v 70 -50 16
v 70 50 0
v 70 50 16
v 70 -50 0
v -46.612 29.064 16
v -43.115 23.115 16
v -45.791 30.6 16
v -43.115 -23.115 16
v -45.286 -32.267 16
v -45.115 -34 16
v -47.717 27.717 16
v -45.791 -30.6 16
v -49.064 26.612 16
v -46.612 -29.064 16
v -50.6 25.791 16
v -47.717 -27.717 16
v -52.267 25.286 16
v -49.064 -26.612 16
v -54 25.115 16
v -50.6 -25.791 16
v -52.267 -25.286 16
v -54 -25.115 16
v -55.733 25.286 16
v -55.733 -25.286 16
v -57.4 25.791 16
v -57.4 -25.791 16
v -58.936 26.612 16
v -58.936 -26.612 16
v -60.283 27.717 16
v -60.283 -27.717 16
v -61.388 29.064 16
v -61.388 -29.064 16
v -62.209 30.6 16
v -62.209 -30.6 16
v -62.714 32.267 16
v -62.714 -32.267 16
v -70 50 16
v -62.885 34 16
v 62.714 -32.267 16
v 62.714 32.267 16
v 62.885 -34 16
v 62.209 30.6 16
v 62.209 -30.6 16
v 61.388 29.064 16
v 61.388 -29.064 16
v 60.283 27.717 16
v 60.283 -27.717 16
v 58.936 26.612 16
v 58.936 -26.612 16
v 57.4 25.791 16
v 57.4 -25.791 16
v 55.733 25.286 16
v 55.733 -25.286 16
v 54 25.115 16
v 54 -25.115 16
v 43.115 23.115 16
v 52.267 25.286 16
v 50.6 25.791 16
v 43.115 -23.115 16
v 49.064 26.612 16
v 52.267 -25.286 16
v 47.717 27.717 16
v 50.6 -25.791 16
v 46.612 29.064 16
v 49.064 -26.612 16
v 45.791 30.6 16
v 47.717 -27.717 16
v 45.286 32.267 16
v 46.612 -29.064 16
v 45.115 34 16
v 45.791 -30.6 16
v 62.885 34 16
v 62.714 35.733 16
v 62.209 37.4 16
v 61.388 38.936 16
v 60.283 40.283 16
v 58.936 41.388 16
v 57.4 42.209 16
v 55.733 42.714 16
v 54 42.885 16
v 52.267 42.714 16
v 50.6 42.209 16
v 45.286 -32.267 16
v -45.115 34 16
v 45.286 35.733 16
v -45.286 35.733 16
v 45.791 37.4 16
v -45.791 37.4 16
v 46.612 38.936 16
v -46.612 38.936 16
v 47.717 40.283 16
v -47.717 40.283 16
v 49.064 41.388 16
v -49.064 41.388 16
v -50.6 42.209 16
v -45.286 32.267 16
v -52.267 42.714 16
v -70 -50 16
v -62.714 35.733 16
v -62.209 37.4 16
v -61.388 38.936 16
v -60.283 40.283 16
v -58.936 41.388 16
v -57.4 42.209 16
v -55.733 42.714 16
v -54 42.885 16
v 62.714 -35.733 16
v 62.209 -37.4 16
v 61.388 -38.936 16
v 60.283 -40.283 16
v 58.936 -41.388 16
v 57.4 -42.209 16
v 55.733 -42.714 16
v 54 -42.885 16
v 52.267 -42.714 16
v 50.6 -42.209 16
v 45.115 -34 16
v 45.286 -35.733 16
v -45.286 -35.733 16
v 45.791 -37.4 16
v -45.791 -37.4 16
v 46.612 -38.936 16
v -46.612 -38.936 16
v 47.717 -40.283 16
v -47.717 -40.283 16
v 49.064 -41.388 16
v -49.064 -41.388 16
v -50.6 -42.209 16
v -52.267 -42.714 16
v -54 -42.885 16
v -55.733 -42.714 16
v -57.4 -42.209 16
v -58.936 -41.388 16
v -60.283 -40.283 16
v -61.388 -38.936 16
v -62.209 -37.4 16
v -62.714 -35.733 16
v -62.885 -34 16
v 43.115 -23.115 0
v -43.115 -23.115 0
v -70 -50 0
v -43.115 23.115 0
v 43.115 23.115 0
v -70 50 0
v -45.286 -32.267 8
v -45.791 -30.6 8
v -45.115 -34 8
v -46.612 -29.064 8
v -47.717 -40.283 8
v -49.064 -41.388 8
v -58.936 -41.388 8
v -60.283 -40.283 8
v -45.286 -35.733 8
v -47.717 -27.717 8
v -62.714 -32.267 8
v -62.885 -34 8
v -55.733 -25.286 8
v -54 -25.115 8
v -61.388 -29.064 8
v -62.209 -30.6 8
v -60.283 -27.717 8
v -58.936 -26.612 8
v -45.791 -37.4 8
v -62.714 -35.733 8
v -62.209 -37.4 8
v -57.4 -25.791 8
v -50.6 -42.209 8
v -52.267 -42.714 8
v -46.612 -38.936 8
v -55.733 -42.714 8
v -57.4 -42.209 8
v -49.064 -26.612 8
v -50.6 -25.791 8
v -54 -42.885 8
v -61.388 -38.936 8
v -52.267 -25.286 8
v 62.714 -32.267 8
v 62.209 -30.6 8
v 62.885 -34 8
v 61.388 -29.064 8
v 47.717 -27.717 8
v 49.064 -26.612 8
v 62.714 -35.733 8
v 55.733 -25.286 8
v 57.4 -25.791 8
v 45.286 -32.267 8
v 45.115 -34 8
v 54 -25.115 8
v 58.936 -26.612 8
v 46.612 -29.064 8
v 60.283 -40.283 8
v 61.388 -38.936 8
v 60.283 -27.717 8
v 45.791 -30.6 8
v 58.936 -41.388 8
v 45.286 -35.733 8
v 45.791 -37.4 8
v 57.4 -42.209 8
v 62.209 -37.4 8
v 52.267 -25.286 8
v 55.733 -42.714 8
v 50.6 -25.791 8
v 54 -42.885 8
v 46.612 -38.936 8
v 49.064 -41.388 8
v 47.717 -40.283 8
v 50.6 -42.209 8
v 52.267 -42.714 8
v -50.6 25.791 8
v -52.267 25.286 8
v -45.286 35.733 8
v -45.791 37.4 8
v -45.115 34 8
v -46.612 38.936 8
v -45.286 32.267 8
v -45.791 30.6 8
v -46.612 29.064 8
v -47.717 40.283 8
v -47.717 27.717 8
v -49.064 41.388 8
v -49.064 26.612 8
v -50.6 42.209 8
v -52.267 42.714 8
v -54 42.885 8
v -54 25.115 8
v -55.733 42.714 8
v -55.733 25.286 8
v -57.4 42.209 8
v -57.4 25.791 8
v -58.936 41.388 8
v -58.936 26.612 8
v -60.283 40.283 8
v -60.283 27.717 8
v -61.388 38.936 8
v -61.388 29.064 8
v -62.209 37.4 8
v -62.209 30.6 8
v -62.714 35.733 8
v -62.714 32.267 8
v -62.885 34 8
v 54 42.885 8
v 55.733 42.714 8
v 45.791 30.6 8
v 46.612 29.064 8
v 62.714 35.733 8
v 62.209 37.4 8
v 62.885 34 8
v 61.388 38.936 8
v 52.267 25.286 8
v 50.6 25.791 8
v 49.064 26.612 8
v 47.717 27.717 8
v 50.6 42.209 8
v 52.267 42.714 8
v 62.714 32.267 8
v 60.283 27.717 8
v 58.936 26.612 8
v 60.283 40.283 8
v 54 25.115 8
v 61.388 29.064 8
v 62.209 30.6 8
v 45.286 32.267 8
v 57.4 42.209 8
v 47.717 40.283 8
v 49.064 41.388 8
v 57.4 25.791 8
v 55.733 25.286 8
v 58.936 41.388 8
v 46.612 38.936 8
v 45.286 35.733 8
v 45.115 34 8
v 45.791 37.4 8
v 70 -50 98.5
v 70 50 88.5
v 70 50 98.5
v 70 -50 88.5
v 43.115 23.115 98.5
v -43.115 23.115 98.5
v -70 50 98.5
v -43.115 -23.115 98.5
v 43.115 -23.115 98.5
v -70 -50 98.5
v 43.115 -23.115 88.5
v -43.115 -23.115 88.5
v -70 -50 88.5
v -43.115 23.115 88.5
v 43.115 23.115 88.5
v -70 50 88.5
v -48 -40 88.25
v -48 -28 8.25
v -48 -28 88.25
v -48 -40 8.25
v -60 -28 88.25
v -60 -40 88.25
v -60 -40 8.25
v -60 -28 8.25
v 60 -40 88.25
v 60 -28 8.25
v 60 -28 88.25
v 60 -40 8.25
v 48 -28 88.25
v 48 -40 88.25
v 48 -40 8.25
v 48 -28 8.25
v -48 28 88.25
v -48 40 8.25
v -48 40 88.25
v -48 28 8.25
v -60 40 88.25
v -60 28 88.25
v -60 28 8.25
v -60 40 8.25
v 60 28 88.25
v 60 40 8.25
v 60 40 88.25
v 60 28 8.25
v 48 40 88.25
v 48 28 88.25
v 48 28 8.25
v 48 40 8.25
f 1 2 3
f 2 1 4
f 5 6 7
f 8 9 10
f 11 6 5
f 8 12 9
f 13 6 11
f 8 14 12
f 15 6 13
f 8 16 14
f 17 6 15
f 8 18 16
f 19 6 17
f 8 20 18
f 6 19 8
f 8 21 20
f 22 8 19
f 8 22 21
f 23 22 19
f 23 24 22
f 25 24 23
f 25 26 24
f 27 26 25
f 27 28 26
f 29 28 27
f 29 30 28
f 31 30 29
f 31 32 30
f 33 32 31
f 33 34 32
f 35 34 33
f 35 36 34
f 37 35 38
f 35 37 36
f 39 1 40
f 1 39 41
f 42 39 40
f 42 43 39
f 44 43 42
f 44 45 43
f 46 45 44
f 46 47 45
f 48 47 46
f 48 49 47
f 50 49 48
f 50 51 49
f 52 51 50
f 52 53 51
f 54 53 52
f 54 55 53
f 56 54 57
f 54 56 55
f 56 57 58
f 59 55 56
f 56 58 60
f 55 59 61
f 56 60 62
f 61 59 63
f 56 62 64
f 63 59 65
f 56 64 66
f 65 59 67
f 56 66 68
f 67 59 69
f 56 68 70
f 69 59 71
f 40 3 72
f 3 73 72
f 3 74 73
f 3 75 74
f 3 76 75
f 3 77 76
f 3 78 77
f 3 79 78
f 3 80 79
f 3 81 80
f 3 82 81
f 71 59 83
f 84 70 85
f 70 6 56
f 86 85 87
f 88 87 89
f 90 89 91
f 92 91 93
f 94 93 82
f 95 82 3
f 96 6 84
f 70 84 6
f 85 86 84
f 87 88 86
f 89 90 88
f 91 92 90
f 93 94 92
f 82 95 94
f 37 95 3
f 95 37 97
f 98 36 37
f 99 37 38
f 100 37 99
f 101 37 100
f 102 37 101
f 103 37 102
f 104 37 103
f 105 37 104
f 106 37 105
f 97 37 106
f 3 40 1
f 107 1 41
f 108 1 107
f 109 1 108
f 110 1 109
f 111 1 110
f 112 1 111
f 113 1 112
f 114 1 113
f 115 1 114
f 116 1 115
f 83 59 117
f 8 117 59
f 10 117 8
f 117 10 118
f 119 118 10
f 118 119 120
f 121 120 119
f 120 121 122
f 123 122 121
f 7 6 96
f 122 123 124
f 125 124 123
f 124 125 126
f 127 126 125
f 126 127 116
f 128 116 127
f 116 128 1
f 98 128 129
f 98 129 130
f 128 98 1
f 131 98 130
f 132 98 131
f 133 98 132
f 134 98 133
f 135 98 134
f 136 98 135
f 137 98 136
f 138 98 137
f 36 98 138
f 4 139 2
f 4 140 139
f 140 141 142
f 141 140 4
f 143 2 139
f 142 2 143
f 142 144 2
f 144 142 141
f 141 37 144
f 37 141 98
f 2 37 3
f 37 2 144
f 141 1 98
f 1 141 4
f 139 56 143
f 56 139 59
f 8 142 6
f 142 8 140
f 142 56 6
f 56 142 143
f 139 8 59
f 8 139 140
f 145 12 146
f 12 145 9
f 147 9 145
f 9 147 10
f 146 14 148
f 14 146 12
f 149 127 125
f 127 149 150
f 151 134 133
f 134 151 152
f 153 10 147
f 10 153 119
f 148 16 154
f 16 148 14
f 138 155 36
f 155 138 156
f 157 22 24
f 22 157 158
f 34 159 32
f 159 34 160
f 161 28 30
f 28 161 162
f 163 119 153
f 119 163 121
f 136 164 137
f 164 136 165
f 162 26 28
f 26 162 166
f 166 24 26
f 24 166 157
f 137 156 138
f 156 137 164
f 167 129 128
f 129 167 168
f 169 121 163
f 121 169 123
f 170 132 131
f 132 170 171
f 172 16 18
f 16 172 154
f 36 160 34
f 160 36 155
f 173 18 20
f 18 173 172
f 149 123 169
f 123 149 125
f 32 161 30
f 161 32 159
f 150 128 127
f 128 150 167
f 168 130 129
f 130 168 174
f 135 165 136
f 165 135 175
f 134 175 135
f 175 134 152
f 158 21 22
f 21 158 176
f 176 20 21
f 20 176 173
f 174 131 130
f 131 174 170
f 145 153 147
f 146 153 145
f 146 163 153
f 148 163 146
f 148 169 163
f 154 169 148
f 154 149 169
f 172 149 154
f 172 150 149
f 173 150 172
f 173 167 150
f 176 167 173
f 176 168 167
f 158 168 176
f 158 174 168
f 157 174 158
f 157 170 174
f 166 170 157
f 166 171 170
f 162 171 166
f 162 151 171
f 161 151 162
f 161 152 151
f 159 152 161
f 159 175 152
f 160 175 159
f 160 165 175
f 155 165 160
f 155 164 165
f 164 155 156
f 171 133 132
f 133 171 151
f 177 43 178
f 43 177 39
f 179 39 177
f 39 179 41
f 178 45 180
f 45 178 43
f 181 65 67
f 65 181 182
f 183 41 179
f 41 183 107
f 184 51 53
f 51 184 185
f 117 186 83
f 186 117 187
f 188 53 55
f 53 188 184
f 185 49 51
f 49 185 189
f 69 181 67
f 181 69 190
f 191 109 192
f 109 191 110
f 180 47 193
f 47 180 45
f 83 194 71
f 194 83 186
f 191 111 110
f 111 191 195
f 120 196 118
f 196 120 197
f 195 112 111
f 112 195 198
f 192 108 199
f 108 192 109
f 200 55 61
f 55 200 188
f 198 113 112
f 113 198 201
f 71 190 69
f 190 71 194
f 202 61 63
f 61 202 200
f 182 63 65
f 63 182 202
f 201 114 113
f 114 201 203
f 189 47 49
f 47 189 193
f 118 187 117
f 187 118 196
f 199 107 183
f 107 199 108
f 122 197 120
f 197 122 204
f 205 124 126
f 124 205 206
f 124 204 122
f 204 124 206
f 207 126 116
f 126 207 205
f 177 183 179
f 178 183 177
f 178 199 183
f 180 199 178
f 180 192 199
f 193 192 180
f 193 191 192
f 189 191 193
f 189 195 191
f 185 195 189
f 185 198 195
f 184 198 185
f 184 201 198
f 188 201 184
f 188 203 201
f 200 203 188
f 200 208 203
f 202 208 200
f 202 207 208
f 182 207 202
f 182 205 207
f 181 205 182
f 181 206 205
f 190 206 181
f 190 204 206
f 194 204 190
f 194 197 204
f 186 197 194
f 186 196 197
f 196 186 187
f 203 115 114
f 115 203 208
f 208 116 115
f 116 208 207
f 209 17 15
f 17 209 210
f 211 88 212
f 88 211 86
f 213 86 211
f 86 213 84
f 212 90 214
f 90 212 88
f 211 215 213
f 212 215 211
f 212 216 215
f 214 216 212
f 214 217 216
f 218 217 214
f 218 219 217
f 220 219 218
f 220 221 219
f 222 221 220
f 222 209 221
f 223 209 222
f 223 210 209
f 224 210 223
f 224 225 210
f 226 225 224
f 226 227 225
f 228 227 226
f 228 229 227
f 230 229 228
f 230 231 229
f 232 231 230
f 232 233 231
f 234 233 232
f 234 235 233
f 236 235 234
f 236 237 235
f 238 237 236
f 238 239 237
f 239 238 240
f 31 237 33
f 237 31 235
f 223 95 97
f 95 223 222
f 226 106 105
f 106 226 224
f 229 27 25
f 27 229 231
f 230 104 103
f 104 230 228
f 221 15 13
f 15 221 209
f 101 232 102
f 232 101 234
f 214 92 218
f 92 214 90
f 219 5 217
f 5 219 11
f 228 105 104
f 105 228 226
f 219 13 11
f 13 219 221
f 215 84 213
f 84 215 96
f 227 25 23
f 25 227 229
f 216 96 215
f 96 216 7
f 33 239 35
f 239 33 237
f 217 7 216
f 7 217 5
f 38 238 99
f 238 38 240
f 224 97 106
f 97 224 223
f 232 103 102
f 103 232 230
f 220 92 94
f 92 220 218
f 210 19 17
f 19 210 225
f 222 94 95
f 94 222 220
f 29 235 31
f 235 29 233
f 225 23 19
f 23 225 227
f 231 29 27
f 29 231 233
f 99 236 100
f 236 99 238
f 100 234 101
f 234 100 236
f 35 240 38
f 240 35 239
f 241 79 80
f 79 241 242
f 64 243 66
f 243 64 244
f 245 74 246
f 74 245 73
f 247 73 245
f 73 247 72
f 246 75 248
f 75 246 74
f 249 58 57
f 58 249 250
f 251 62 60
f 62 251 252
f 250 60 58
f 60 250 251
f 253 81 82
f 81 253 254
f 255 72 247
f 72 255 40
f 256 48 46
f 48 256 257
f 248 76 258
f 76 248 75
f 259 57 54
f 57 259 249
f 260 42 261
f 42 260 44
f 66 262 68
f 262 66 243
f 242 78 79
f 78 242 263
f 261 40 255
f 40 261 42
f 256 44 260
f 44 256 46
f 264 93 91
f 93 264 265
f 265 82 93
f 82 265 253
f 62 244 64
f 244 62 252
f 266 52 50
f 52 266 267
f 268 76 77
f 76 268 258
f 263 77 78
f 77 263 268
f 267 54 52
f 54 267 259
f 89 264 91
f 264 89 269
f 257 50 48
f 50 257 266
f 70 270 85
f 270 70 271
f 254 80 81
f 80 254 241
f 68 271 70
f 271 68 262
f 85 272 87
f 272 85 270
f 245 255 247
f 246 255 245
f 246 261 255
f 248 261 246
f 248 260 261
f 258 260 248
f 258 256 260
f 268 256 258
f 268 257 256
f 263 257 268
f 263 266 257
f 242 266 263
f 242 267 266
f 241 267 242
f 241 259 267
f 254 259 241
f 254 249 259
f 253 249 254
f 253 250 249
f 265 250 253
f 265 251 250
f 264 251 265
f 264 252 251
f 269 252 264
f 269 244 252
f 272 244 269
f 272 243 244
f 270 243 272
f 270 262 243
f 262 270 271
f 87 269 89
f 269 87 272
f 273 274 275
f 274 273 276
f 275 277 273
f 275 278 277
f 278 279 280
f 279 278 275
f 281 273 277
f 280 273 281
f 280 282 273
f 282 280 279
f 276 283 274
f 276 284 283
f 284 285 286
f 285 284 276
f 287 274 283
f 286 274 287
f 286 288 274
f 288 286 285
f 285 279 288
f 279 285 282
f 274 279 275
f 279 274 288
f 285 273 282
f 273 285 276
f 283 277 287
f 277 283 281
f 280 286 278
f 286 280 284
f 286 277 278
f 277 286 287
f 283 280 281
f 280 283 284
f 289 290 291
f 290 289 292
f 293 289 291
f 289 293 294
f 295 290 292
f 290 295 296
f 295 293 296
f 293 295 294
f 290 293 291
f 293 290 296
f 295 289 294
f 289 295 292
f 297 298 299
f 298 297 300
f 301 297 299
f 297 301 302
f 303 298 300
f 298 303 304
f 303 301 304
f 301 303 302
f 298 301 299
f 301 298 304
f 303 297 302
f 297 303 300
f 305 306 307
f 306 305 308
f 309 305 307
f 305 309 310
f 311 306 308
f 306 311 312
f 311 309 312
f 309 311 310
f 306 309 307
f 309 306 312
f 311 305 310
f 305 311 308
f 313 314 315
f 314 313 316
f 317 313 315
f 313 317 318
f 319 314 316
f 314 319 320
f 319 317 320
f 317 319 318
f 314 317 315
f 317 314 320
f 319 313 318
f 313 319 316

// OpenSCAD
$fn = 32;

// ------------------------------------------------------------------------
// Frame cube: base 140 x 100 mm, posts 80 mm tall
// Every part is its own module, assembly() places every instance.
// ------------------------------------------------------------------------

// --- part 1 ---
module base_frame() {
  difference() {
    translate([-70, -50, 0]) cube([140, 100, 16]);
    translate([-43.115, -23.115, -1]) cube([86.23, 46.23, 18]);
    translate([-54, -34, 8]) cylinder(h = 9, d = 17.77);
    translate([54, -34, 8]) cylinder(h = 9, d = 17.77);
    translate([-54, 34, 8]) cylinder(h = 9, d = 17.77);
    translate([54, 34, 8]) cylinder(h = 9, d = 17.77);
  }
}

// --- part 2 ---
module corner_post() {
  translate([-6, -6, 0]) cube([12, 12, 80]);
}

// --- part 3 ---
module top_frame() {
  difference() {
    translate([-70, -50, 0]) cube([140, 100, 10]);
    translate([-43.115, -23.115, -1]) cube([86.23, 46.23, 12]);
  }
}

// --- assembly ---
module assembly() {
  color([0.80, 0.24, 0.20]) translate([0, 0, 0]) rotate([0, 0, 0]) base_frame();
  color([0.20, 0.45, 0.75]) translate([-54, -34, 8.25]) rotate([0, 0, 0]) corner_post();
  color([0.25, 0.62, 0.32]) translate([54, -34, 8.25]) rotate([0, 0, 0]) corner_post();
  color([0.92, 0.70, 0.18]) translate([-54, 34, 8.25]) rotate([0, 0, 0]) corner_post();
  color([0.58, 0.35, 0.70]) translate([54, 34, 8.25]) rotate([0, 0, 0]) corner_post();
  color([0.16, 0.66, 0.66]) translate([0, 0, 88.5]) rotate([0, 0, 0]) top_frame();
}

assembly();
